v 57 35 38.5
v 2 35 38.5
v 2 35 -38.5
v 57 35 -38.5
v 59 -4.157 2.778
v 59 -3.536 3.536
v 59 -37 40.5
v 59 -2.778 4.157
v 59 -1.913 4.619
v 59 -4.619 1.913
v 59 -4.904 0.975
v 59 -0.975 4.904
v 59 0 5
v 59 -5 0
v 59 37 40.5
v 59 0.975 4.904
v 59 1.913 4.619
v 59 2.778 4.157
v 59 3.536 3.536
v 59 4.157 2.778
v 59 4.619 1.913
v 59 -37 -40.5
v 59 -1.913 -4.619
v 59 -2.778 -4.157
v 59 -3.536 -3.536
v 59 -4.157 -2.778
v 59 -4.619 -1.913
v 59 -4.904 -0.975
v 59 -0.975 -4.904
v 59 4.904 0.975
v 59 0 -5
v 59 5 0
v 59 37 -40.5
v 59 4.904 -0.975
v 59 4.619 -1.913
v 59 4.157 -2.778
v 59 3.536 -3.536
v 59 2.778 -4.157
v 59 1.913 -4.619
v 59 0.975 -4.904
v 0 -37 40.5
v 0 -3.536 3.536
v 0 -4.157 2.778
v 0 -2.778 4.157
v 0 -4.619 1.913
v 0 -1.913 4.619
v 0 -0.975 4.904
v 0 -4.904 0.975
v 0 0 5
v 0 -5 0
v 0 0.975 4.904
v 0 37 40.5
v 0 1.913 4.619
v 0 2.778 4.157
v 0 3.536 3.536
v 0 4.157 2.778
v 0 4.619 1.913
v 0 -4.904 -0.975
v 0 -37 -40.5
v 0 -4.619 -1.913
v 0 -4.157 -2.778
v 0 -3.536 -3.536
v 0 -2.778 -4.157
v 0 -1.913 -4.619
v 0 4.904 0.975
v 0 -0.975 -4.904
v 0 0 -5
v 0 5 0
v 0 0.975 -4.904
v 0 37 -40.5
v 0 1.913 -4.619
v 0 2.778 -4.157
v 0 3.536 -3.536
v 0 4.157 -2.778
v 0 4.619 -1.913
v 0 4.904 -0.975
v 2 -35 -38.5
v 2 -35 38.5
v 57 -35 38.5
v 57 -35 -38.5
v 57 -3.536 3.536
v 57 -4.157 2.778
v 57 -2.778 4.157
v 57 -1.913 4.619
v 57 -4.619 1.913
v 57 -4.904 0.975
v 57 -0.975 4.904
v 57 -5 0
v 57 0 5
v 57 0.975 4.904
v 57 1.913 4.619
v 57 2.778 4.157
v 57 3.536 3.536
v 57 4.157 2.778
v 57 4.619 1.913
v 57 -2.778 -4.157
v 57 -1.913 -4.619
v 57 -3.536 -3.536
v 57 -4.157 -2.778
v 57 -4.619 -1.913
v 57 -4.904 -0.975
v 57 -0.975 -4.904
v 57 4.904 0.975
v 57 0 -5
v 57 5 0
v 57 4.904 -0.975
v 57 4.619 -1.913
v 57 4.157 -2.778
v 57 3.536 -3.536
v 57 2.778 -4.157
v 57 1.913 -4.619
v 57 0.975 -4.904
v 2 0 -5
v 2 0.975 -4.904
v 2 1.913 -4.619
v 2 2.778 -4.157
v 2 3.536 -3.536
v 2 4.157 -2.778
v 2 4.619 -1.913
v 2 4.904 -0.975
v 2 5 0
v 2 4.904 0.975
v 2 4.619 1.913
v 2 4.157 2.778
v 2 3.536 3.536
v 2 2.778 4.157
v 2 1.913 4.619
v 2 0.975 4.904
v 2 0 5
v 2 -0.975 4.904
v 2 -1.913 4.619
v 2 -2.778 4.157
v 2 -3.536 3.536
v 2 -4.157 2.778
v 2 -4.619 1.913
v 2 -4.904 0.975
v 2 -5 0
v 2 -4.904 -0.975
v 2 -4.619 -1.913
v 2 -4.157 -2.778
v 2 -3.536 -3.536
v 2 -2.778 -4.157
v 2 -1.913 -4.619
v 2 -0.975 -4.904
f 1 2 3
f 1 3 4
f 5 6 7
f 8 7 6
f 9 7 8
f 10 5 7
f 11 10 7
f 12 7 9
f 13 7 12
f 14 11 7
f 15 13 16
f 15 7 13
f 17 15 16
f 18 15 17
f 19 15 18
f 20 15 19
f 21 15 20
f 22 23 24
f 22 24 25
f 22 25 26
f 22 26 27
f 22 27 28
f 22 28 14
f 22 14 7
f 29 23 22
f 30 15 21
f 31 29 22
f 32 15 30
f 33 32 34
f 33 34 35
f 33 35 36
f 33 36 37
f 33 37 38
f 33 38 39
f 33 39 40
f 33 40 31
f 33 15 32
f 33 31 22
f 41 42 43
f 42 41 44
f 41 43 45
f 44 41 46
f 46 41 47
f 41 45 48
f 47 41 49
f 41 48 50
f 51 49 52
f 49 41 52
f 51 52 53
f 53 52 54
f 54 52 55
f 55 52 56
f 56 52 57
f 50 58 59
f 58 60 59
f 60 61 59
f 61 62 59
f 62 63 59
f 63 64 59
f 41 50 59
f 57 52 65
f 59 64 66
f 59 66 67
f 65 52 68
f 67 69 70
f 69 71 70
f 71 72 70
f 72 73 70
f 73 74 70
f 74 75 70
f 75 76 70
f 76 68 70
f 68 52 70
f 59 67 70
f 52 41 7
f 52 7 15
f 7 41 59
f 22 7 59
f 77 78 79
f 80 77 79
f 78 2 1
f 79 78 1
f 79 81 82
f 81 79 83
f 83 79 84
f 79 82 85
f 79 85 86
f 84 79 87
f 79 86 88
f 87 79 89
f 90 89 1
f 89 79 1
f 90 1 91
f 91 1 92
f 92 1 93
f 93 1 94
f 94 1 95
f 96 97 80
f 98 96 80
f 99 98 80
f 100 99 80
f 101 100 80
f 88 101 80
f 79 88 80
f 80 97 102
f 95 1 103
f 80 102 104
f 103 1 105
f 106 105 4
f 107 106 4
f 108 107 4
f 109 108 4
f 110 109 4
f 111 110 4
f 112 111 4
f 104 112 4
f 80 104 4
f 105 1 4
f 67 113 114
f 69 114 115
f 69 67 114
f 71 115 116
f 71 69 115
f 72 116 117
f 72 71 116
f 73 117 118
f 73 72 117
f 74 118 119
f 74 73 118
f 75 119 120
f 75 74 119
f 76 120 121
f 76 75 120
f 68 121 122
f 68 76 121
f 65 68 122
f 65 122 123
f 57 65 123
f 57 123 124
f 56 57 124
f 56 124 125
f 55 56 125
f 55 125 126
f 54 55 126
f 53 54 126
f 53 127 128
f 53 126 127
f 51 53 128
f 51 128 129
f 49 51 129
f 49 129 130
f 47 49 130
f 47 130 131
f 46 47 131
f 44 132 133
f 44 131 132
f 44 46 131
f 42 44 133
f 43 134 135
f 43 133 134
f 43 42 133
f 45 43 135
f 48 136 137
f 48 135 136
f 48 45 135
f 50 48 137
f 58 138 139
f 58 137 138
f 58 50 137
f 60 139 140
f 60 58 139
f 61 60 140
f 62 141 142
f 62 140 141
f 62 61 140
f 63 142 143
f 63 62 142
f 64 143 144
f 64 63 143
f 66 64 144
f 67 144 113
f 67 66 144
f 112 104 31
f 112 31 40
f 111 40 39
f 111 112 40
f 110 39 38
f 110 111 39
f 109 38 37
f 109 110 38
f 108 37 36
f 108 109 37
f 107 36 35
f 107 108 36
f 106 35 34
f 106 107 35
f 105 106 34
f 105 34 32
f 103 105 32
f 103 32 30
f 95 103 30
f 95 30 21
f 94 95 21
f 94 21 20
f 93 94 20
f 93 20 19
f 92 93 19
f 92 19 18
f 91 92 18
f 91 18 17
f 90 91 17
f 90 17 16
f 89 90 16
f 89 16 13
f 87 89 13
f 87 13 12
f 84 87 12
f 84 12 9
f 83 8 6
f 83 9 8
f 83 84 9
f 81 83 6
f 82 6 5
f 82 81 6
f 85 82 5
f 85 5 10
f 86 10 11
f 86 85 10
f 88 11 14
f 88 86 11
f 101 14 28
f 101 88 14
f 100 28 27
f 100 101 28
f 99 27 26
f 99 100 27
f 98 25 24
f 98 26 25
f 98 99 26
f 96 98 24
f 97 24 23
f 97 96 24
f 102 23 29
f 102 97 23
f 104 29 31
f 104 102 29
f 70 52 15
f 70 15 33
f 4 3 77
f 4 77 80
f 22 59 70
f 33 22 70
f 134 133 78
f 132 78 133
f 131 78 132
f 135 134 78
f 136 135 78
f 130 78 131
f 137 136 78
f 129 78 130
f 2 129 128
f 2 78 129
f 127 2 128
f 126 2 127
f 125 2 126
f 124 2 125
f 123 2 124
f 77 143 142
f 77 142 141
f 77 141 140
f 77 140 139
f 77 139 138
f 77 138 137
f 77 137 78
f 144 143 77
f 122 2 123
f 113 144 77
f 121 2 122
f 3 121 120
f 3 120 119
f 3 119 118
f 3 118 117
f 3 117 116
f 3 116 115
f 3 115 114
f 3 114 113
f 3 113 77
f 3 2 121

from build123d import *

# Parameters (mm, degrees)
SKETCH1_W           = 81
SKETCH1_H           = 74
BOSS_EXTRUDE1_DEPTH = 59
SKETCH3_R           = 5
CUT_EXTRUDE1_DEPTH  = 160
SKETCH4_W           = 55
SKETCH4_H           = 77
CUT_EXTRUDE2_DEPTH  = 70


with BuildPart() as part:
    # Sketch1 → Boss-Extrude1 (new body)
    with BuildSketch(Plane(origin=(0, 0, 0), x_dir=(0, 0, -1), z_dir=(1, 0, 0))):
        Rectangle(SKETCH1_W, SKETCH1_H)
    extrude(amount=BOSS_EXTRUDE1_DEPTH)

    # Sketch3 → Cut-Extrude1 (cut)
    with BuildSketch(Plane(origin=(0, 0, 0), x_dir=(0, 0, -1), z_dir=(1, 0, 0))):
        Circle(SKETCH3_R)
    extrude(amount=CUT_EXTRUDE1_DEPTH, mode=Mode.SUBTRACT)

    # Sketch4 → Cut-Extrude2 (cut)
    with BuildSketch(Plane(origin=(0, 35, 0), x_dir=(1, 0, 0), z_dir=(0, 1, 0))):
        with Locations((29.5, 0)):
            Rectangle(SKETCH4_W, SKETCH4_H)
    extrude(amount=-CUT_EXTRUDE2_DEPTH, mode=Mode.SUBTRACT)


solid = part.part
